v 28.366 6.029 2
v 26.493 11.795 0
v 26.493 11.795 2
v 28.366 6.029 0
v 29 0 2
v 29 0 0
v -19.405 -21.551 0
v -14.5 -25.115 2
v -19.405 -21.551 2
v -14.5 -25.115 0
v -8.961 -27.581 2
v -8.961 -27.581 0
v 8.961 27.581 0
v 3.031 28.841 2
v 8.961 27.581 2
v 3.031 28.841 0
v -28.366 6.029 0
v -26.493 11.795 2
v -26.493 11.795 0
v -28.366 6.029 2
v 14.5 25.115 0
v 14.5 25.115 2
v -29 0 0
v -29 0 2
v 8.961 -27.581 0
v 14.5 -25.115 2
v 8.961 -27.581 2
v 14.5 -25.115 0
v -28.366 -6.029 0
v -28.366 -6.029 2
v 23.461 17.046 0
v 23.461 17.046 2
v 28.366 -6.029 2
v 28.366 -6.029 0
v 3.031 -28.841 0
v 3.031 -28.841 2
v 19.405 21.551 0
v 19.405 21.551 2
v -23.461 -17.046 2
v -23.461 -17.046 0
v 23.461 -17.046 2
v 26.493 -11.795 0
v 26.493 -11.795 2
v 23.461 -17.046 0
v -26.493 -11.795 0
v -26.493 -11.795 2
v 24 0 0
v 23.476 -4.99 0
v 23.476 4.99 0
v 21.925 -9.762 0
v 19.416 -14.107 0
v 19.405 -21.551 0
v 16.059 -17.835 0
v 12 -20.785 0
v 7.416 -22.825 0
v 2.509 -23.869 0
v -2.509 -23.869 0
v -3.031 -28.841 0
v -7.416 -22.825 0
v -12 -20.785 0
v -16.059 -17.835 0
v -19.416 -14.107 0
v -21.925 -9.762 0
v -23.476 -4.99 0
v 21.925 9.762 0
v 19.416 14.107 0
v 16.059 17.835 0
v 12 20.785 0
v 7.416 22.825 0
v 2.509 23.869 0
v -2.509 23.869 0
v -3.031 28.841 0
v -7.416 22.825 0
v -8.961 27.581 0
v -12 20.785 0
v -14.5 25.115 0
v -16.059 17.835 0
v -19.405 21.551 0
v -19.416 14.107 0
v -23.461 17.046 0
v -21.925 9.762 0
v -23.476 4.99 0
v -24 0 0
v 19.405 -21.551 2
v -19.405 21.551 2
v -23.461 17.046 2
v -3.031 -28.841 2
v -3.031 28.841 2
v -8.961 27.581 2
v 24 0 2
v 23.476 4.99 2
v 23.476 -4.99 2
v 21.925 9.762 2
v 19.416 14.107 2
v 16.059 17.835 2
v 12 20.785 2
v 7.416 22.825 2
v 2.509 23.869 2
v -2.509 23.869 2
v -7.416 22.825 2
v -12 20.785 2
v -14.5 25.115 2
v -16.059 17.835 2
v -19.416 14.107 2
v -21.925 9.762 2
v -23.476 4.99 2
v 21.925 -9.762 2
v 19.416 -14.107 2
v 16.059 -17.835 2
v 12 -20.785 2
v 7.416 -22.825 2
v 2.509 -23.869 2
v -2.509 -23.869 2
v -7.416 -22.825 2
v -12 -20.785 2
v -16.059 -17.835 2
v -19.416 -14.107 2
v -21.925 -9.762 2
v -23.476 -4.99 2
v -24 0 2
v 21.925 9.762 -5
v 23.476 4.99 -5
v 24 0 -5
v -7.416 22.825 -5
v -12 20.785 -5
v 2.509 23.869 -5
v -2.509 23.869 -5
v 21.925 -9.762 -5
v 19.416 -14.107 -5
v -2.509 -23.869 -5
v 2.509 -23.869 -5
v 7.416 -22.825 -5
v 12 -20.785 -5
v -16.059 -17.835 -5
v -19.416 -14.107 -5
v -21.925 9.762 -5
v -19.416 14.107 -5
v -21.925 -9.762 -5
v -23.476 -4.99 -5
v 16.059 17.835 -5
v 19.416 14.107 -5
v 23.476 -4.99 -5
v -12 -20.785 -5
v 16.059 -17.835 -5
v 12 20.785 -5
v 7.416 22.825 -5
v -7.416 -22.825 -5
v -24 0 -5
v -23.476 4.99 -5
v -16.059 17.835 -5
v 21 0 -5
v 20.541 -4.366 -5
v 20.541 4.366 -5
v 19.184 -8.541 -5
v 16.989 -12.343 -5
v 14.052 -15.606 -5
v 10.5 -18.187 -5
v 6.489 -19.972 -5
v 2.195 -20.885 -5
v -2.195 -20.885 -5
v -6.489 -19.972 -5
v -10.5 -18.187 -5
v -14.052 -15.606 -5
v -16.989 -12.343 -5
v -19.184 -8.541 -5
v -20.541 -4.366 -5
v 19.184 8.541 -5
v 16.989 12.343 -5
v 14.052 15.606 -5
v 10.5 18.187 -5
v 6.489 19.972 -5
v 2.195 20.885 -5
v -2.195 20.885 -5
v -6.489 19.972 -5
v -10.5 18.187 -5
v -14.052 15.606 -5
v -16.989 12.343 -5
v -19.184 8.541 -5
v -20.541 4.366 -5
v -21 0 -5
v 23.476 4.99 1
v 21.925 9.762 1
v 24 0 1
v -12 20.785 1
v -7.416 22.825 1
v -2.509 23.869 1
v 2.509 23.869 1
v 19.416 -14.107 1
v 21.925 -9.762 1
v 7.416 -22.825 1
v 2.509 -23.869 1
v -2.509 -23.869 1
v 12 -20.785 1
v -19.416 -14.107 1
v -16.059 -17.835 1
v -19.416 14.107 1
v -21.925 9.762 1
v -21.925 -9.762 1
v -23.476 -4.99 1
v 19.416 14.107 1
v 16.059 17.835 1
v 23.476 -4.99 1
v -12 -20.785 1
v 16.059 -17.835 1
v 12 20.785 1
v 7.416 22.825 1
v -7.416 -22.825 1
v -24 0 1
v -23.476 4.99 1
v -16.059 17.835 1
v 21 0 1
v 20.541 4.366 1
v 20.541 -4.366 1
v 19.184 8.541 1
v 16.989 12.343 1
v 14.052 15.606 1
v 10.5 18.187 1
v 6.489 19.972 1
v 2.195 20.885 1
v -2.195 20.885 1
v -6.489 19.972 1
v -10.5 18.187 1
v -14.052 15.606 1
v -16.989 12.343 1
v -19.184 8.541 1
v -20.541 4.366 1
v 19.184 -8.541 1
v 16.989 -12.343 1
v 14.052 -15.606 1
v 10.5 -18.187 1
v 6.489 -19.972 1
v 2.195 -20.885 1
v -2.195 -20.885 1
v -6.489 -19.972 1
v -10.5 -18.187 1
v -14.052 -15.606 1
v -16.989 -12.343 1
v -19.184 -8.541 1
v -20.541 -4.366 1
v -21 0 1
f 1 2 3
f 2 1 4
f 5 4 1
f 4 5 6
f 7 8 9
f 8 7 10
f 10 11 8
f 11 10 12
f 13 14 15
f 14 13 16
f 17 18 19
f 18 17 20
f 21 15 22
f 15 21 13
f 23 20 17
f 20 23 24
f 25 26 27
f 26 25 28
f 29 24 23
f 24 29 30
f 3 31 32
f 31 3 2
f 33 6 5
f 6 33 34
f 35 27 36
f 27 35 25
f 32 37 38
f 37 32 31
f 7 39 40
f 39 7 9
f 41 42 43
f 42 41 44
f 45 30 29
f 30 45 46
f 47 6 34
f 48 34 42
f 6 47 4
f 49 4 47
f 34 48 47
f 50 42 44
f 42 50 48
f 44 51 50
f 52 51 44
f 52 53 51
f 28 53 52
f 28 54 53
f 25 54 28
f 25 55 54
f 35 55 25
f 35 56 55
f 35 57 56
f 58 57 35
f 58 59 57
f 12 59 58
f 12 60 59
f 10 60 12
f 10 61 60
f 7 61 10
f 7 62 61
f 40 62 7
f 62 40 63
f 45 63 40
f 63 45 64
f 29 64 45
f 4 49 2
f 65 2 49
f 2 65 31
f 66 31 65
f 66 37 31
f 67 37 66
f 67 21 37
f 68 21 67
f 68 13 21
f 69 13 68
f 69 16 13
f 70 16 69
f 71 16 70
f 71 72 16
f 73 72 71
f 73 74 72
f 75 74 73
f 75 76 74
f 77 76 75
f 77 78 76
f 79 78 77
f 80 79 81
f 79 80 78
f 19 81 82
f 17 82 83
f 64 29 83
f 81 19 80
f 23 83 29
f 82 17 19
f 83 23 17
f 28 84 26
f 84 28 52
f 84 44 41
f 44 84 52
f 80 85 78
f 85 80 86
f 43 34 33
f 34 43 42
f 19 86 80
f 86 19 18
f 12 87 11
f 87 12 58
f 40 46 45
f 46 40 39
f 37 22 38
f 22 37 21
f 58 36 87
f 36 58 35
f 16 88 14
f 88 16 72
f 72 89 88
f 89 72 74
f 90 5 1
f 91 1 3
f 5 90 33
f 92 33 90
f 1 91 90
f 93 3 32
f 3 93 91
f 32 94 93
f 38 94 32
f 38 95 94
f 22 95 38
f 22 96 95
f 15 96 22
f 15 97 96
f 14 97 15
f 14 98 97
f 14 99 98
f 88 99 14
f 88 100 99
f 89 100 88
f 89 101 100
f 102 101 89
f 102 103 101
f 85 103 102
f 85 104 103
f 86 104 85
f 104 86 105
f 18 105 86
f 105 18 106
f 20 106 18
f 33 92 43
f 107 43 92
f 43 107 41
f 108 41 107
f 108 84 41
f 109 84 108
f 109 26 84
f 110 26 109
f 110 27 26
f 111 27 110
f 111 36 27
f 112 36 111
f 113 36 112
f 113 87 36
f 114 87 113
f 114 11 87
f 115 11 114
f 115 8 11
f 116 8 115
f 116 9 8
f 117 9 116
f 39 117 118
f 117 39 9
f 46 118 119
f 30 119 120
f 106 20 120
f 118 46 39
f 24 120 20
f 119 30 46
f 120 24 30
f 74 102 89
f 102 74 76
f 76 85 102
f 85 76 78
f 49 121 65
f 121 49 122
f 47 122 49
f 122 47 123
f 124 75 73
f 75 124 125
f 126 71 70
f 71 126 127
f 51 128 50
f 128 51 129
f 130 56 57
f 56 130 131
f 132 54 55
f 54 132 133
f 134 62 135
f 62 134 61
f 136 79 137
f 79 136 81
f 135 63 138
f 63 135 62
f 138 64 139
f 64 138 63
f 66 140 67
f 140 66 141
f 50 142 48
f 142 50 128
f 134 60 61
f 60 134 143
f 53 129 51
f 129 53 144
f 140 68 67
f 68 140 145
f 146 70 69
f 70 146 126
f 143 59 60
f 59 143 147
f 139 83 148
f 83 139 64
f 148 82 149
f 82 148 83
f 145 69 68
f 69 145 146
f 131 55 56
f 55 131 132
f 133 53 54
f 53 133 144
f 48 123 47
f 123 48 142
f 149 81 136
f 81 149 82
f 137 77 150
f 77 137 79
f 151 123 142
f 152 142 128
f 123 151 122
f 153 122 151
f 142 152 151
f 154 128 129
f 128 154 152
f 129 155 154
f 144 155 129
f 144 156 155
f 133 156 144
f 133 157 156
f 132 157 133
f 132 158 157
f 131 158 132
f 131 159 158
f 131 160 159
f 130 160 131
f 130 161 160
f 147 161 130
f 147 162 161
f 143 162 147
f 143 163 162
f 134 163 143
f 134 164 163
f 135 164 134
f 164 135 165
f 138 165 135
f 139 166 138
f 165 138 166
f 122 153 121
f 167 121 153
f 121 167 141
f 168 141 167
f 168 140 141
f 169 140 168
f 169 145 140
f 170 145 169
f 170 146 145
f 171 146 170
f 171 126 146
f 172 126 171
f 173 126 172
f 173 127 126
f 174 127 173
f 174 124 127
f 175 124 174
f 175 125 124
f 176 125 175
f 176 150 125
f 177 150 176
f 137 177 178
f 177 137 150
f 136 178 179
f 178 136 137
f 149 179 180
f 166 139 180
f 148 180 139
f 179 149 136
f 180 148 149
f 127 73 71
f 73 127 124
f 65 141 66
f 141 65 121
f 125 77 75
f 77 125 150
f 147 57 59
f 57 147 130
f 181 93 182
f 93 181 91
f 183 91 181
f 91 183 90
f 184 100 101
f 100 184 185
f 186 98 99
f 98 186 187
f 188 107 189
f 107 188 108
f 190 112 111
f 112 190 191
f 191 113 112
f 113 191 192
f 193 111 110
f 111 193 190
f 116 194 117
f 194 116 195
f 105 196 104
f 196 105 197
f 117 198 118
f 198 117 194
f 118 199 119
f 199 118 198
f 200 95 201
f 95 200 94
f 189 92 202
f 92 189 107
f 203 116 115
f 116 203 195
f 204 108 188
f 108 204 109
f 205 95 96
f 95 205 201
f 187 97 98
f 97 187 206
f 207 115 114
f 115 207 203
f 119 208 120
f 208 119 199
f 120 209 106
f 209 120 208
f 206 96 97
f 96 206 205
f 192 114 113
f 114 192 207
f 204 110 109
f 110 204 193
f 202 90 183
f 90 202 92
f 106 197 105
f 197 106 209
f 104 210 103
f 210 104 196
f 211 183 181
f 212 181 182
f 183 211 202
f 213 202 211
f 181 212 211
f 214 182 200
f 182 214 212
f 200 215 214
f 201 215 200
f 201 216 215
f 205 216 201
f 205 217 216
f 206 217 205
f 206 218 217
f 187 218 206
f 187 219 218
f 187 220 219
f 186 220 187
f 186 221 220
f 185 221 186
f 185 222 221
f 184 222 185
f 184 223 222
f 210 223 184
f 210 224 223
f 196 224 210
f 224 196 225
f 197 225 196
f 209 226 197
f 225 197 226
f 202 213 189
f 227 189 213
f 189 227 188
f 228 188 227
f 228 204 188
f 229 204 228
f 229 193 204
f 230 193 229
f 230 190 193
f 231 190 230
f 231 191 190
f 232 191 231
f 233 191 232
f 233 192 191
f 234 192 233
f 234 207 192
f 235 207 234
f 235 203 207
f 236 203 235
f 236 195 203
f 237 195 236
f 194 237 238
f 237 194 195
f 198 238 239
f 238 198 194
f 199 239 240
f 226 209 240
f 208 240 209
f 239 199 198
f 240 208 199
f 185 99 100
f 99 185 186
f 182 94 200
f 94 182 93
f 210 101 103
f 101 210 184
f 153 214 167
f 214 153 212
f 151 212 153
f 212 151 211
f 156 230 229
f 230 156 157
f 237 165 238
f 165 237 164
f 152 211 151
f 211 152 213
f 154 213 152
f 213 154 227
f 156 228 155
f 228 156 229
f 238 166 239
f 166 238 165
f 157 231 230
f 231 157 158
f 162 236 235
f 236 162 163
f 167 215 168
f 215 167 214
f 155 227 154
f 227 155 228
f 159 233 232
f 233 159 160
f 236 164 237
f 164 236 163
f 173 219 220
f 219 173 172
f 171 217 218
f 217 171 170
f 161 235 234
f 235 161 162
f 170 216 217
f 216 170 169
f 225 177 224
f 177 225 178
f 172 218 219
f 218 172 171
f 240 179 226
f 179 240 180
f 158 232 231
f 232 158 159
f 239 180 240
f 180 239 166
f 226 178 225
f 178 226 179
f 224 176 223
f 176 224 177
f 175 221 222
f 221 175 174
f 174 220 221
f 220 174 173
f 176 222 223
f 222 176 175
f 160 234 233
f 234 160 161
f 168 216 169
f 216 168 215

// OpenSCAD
TOP_CAP = 58;
TOP_CAP_MARGIN = 5;
PD_TOP_CAP = 48;
PD_TOP_MARGIN = 3;


module support(cap1, cap2, e1, e2) {
    linear_extrude(e1)
        circle(d=cap1);
    translate([0,0,-e2+1])
        linear_extrude(e2)
            circle(d=cap2);
}

difference() { 
    support(TOP_CAP, TOP_CAP - TOP_CAP_MARGIN*2, 2, 6);
    translate([0,0,1])
        support(PD_TOP_CAP, PD_TOP_CAP - PD_TOP_MARGIN*2, 2, 10);
}
